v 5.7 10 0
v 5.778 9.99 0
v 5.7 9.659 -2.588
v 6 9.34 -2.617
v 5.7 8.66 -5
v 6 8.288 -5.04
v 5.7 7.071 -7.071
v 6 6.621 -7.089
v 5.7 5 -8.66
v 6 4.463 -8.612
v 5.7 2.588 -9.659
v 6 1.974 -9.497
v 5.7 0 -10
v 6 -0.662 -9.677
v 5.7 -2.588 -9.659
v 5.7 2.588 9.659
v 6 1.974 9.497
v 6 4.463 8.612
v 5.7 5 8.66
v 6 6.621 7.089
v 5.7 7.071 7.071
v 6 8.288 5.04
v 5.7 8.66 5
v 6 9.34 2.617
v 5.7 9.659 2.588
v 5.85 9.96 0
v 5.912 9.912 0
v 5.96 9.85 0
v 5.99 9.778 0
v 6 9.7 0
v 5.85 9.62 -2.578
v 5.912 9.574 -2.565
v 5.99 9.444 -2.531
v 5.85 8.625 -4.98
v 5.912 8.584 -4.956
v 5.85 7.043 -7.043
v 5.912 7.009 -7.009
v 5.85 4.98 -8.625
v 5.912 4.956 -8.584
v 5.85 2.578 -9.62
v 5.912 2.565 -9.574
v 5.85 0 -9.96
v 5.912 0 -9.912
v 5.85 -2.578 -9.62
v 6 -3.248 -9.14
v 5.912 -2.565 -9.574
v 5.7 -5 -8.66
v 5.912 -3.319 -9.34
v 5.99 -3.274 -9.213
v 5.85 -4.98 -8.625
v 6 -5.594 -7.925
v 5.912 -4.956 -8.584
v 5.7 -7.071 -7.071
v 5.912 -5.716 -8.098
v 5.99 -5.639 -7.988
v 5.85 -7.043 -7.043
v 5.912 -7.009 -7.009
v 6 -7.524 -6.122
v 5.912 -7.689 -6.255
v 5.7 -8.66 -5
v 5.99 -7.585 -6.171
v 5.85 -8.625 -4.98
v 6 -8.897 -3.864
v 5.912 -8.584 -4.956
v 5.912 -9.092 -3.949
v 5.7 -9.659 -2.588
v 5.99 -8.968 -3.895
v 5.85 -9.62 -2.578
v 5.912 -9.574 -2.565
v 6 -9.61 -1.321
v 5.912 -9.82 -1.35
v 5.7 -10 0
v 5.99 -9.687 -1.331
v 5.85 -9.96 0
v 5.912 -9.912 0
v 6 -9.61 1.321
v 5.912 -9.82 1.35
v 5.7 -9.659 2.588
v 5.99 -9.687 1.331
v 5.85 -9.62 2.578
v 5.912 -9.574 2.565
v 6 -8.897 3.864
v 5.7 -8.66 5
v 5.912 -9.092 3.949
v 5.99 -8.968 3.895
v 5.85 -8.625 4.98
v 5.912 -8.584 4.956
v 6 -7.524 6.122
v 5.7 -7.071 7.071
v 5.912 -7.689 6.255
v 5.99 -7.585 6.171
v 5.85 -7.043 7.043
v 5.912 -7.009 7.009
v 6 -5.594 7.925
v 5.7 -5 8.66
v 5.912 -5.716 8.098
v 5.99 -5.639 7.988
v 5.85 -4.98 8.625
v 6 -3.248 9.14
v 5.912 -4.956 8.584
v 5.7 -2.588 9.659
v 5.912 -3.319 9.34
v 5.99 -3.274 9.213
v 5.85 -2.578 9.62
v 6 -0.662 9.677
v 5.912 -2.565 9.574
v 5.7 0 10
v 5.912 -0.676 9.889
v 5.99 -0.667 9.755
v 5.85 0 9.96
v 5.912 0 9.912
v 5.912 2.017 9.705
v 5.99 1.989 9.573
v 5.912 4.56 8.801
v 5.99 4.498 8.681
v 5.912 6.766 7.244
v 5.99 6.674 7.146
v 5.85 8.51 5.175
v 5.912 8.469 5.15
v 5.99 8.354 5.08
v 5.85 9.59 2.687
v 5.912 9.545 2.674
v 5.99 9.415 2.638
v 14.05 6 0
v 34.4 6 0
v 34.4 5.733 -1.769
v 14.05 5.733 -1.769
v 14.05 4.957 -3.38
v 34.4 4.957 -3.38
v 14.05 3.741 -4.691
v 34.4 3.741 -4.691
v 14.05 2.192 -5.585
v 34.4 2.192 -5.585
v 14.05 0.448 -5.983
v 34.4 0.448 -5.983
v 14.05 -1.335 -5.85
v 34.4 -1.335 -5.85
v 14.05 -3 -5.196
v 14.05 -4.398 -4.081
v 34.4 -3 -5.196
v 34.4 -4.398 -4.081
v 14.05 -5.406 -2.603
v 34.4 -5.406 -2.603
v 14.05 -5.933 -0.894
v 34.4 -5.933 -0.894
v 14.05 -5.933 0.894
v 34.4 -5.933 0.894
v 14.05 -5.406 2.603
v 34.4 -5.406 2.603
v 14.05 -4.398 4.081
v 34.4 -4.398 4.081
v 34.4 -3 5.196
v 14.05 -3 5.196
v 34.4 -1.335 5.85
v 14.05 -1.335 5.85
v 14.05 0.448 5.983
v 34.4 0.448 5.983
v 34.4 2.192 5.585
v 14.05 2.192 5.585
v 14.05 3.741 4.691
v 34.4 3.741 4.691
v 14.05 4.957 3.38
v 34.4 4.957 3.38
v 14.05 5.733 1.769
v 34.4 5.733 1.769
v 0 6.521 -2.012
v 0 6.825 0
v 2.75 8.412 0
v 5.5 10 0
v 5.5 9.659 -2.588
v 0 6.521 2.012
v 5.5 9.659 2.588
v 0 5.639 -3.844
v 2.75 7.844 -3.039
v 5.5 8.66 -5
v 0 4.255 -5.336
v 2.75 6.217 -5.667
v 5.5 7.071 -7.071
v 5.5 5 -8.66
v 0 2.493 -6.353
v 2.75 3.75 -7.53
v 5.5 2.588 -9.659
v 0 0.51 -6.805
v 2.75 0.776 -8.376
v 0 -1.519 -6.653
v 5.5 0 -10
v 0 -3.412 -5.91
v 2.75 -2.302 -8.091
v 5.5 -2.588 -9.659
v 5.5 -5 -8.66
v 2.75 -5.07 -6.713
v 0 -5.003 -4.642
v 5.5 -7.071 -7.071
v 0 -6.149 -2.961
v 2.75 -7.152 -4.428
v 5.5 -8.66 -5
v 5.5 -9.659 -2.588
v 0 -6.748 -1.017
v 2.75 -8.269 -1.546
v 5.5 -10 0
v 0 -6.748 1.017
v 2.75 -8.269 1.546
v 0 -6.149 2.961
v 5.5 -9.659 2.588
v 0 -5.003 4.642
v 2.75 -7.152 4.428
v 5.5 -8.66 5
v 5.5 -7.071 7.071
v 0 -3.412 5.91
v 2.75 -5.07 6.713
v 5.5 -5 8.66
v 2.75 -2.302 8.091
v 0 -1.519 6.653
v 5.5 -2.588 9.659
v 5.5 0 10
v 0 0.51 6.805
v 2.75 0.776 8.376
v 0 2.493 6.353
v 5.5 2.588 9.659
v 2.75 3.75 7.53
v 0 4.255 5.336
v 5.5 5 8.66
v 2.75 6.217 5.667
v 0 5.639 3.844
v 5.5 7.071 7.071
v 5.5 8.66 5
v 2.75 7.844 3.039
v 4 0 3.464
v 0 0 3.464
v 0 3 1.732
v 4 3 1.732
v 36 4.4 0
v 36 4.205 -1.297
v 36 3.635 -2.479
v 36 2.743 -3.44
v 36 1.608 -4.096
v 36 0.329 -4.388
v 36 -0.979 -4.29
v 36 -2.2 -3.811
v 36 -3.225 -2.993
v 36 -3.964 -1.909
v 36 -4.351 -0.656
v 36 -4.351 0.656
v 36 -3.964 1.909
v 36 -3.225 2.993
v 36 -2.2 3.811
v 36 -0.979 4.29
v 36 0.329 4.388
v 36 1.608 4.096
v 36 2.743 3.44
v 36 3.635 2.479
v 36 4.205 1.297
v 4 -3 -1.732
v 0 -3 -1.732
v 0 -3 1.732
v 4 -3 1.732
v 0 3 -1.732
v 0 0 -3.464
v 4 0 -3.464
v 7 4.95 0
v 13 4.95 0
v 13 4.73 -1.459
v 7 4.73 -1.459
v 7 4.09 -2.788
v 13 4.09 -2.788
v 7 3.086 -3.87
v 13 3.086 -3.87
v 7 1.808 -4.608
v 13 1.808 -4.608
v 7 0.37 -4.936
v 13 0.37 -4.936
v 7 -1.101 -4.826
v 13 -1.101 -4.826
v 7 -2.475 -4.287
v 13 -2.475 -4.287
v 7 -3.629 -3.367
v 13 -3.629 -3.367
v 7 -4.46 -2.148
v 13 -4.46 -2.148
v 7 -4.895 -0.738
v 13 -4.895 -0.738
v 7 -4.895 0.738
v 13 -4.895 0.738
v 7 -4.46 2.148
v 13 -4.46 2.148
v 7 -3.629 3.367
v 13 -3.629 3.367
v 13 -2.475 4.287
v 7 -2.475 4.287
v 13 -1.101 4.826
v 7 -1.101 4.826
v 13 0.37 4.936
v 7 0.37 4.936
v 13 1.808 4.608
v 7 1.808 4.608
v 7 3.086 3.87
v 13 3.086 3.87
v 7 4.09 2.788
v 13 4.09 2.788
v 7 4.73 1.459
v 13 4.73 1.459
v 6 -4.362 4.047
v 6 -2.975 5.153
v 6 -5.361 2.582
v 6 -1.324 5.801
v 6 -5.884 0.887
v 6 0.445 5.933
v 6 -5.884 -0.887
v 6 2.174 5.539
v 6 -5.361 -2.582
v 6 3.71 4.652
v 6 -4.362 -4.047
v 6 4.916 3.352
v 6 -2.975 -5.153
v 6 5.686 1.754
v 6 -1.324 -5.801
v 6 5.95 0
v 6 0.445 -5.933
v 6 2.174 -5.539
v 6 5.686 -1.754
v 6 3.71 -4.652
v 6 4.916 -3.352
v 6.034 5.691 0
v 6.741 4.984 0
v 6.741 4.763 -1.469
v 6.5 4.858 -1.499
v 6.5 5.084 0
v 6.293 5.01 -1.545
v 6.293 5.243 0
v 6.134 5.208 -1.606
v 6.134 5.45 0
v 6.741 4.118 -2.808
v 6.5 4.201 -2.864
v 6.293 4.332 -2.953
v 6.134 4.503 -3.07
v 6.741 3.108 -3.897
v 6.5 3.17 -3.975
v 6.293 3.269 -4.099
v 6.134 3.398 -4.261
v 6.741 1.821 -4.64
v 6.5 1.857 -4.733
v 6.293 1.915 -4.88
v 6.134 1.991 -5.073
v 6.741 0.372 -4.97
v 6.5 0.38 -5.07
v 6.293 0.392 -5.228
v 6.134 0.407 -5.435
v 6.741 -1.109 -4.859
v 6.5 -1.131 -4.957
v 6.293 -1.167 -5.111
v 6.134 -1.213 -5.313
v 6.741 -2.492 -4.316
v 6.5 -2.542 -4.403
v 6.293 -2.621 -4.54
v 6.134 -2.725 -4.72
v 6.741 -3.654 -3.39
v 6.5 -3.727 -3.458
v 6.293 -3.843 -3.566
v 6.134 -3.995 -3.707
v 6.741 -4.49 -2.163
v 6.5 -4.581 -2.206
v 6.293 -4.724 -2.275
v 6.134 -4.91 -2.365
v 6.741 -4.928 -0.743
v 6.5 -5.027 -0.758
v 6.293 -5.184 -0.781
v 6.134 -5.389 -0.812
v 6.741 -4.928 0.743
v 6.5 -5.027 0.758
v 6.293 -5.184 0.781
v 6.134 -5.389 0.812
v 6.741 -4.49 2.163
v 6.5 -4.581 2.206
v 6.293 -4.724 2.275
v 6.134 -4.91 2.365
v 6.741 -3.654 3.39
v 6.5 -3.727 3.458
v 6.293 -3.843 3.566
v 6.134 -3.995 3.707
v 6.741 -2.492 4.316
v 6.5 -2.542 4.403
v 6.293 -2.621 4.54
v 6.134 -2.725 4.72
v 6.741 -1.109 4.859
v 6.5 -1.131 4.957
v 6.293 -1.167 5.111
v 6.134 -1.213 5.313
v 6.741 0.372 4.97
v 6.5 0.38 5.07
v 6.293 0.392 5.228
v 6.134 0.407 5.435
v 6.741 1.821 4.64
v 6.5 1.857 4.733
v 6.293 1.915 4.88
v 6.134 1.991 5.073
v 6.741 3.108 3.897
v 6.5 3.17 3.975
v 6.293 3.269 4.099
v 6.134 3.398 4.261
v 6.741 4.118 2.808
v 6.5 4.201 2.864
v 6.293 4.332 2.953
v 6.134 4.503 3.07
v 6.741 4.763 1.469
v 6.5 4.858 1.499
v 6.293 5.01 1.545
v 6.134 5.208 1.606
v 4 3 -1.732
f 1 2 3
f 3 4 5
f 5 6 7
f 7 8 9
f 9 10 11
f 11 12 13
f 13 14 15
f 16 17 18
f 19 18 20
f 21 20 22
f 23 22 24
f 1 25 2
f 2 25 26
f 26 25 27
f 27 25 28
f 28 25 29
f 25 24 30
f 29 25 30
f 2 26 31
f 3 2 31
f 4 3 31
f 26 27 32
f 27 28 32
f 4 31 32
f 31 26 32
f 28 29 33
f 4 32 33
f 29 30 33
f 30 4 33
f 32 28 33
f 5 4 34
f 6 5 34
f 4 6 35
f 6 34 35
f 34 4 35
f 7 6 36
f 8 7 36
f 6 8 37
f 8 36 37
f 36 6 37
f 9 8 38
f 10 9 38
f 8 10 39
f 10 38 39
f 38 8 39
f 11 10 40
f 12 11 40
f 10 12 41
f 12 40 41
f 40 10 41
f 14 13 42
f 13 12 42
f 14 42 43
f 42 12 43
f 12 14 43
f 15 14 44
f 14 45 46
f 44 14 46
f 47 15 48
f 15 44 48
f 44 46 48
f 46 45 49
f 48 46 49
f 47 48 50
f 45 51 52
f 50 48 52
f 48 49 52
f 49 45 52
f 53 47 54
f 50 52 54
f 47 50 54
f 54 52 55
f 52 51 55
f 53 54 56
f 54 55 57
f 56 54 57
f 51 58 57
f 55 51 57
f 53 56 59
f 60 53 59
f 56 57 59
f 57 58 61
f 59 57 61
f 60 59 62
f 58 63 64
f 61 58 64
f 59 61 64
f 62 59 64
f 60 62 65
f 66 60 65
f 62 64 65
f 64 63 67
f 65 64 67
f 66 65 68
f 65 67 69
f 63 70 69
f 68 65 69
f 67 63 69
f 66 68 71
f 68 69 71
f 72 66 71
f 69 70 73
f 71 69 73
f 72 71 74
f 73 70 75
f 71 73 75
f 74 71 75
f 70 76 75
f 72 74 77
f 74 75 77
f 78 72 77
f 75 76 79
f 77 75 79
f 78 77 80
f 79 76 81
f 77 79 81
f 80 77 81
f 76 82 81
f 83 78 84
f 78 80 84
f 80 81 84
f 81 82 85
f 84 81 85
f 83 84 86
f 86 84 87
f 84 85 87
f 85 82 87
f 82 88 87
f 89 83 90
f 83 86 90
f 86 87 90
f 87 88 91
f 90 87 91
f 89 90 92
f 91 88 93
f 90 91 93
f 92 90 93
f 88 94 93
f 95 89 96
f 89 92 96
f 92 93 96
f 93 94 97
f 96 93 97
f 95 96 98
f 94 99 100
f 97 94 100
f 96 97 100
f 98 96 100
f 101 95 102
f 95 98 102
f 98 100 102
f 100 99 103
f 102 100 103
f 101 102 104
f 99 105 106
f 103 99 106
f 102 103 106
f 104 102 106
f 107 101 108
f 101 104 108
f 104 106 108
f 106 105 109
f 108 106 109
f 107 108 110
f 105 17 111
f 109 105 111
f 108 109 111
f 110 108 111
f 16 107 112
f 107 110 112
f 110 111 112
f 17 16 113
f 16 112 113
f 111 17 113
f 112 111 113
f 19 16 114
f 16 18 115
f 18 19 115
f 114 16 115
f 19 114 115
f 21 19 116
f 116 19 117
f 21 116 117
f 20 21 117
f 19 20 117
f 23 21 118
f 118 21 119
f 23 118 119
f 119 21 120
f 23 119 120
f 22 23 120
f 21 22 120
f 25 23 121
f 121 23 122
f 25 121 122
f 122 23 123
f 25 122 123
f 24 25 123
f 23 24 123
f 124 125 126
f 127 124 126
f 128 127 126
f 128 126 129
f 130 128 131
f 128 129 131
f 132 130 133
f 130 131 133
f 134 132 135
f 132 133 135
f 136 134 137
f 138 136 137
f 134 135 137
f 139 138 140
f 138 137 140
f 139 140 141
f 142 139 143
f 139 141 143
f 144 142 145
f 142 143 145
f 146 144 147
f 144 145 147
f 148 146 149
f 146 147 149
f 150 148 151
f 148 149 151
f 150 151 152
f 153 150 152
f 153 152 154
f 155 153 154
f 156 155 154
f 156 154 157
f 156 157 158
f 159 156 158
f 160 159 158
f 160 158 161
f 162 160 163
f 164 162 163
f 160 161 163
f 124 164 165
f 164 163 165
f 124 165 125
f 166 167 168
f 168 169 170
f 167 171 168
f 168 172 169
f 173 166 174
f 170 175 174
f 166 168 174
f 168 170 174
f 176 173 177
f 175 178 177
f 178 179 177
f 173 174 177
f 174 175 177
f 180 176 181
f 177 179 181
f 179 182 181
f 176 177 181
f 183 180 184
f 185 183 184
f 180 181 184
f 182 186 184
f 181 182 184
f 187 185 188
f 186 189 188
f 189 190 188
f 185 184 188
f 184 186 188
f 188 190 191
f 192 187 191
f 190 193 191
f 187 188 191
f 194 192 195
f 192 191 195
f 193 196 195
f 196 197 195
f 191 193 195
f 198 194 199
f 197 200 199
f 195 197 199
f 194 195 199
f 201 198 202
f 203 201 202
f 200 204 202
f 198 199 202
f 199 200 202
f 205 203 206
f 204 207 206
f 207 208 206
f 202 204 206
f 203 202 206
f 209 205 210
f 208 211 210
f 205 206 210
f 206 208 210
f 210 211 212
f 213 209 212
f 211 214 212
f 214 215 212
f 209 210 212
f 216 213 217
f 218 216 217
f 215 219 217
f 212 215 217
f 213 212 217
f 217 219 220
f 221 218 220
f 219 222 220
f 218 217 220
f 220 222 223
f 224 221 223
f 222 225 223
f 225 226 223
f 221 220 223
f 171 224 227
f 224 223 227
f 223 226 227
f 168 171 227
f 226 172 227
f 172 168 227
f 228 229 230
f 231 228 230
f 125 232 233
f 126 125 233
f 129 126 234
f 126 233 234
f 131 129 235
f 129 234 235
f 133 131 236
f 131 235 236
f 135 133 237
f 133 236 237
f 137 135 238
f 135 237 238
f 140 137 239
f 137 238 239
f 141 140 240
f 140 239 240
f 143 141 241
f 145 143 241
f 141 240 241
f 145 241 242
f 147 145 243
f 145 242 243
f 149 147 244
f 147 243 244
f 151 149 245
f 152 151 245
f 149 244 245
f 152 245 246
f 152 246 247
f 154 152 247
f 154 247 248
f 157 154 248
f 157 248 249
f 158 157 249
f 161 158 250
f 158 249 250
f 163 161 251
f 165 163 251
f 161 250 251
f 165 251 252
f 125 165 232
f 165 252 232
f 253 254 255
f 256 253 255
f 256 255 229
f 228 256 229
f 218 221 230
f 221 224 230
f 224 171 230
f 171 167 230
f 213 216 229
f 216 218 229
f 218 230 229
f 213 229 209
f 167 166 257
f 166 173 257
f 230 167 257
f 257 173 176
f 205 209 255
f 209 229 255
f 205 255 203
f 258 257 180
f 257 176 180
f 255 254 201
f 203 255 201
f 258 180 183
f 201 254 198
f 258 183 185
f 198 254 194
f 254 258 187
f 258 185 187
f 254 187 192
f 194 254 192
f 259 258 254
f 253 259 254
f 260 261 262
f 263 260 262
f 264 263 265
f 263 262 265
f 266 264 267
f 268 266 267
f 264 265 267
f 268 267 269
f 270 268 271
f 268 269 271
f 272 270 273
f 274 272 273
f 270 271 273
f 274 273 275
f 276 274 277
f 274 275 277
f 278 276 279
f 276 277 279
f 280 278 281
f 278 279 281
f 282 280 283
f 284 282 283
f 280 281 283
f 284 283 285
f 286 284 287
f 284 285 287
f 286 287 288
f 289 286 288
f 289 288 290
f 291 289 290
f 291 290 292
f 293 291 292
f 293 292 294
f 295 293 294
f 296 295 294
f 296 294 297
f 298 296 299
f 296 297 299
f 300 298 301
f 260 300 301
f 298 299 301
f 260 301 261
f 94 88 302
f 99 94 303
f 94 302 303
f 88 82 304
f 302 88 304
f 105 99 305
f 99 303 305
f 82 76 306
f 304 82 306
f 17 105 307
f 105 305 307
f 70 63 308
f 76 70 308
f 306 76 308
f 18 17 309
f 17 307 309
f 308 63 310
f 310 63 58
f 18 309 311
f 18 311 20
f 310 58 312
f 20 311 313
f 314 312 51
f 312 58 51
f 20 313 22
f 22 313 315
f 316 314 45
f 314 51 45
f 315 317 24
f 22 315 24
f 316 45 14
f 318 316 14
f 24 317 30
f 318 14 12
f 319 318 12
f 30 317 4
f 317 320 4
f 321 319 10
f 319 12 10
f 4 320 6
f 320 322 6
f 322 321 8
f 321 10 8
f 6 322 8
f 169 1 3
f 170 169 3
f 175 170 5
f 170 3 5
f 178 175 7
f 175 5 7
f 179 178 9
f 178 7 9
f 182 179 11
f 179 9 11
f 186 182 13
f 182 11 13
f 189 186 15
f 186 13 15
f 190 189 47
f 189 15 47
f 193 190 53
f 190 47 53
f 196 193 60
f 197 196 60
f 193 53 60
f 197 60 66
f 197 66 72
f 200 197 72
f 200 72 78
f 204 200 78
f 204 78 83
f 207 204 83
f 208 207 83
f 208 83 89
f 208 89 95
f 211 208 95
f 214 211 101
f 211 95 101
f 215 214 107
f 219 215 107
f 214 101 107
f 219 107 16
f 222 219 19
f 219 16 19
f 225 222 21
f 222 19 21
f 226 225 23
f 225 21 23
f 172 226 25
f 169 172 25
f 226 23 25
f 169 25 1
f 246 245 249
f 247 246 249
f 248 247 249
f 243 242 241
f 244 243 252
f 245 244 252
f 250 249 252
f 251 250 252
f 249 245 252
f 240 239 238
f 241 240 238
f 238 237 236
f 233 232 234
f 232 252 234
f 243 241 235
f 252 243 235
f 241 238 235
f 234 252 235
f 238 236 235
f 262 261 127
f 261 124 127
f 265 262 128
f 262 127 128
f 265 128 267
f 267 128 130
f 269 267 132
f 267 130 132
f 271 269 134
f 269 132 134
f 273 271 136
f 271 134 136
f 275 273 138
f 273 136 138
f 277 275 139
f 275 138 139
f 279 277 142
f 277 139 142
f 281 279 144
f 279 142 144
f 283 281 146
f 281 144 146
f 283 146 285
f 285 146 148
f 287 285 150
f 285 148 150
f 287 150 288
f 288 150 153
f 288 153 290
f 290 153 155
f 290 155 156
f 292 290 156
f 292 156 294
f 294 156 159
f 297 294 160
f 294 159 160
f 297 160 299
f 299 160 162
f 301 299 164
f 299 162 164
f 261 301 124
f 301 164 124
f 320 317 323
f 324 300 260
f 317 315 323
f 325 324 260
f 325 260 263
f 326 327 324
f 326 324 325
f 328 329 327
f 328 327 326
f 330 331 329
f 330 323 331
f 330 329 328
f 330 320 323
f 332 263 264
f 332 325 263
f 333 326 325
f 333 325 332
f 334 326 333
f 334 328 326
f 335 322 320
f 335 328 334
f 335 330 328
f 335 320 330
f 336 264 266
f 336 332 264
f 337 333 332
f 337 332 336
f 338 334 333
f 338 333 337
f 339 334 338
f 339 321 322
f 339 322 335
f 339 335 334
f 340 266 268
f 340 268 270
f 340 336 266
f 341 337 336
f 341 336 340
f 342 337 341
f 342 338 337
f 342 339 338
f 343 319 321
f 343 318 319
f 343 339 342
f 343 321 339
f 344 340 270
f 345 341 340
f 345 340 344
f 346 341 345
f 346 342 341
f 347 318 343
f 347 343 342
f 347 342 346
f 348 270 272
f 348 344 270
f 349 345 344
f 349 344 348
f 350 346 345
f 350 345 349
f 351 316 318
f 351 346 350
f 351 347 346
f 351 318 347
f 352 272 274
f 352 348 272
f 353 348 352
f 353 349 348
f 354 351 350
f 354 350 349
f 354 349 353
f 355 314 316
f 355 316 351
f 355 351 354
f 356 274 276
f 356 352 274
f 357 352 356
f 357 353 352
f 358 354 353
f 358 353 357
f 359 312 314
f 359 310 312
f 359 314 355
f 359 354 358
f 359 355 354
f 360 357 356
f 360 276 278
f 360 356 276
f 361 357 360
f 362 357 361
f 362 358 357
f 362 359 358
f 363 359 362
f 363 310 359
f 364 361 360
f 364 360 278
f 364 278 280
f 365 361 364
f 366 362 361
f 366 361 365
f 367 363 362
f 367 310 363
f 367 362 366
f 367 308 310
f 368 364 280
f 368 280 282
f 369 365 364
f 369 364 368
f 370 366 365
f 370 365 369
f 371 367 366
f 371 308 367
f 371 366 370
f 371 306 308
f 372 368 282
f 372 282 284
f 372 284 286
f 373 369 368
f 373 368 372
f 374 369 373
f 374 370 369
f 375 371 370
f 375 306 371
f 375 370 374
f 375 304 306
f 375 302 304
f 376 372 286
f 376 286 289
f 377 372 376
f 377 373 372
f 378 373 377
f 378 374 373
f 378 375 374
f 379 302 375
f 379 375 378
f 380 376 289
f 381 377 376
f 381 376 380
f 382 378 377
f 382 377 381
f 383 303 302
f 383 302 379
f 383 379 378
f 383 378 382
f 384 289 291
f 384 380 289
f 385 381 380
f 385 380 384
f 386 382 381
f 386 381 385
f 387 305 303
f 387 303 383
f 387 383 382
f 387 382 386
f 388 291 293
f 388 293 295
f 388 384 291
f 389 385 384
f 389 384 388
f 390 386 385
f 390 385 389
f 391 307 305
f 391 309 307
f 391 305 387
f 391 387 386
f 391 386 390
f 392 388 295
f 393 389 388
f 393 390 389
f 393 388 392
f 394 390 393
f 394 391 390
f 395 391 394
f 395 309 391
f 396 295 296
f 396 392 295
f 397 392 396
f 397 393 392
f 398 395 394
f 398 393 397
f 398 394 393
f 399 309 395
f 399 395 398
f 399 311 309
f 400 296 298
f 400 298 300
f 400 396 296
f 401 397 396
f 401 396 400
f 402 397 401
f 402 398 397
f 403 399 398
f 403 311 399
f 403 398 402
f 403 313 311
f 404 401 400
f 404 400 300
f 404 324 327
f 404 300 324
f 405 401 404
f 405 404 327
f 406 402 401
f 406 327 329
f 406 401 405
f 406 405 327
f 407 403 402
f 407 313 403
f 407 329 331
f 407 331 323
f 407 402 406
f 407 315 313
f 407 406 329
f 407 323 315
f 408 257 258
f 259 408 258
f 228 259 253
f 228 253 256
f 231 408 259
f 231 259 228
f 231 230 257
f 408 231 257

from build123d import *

# Parameters (mm, degrees)
CUT_EXTRUDE_1_DEPTH = 4
FILLET_1_R          = 0.3
CHAMFER_1_SIZE      = 1.6
FILLET_2_R          = 1


with BuildPart() as part:
    # Эскиз1 → Повернуть1 (revolve)
    with BuildSketch(Plane.XY):
        Polygon((0, 0), (0, 6.824573519), (5.5, 10), (6, 10), (6, 4.95), (13, 4.95), (14.05, 6), (36, 6), (36, 0), align=None)
    revolve(axis=Axis((36, 0, 0), (-1, 0, 0)))

    # Эскиз2 → Вырез-Вытянуть1 (cut)
    with BuildSketch(Plane.ZY):
        Polygon((1.732050808, 3), (-1.732050808, 3), (-3.464101615, 0), (-1.732050808, -3), (1.732050808, -3), (3.464101615, 0), align=None)
    extrude(amount=-CUT_EXTRUDE_1_DEPTH, mode=Mode.SUBTRACT)

    # Скругление1
    fillet_1_edges = [part.edges().sort_by_distance(p)[0] for p in [
        (6, -10, 0),
    ]]
    fillet(fillet_1_edges, radius=FILLET_1_R)

    # Фаска1
    chamfer_1_edges = [part.edges().sort_by_distance(p)[0] for p in [
        (36, -6, 0),
    ]]
    chamfer(chamfer_1_edges, length=CHAMFER_1_SIZE)

    # Скругление2
    fillet_2_edges = [part.edges().sort_by_distance(p)[0] for p in [
        (6, -4.95, 0),
    ]]
    fillet(fillet_2_edges, radius=FILLET_2_R)


solid = part.part
